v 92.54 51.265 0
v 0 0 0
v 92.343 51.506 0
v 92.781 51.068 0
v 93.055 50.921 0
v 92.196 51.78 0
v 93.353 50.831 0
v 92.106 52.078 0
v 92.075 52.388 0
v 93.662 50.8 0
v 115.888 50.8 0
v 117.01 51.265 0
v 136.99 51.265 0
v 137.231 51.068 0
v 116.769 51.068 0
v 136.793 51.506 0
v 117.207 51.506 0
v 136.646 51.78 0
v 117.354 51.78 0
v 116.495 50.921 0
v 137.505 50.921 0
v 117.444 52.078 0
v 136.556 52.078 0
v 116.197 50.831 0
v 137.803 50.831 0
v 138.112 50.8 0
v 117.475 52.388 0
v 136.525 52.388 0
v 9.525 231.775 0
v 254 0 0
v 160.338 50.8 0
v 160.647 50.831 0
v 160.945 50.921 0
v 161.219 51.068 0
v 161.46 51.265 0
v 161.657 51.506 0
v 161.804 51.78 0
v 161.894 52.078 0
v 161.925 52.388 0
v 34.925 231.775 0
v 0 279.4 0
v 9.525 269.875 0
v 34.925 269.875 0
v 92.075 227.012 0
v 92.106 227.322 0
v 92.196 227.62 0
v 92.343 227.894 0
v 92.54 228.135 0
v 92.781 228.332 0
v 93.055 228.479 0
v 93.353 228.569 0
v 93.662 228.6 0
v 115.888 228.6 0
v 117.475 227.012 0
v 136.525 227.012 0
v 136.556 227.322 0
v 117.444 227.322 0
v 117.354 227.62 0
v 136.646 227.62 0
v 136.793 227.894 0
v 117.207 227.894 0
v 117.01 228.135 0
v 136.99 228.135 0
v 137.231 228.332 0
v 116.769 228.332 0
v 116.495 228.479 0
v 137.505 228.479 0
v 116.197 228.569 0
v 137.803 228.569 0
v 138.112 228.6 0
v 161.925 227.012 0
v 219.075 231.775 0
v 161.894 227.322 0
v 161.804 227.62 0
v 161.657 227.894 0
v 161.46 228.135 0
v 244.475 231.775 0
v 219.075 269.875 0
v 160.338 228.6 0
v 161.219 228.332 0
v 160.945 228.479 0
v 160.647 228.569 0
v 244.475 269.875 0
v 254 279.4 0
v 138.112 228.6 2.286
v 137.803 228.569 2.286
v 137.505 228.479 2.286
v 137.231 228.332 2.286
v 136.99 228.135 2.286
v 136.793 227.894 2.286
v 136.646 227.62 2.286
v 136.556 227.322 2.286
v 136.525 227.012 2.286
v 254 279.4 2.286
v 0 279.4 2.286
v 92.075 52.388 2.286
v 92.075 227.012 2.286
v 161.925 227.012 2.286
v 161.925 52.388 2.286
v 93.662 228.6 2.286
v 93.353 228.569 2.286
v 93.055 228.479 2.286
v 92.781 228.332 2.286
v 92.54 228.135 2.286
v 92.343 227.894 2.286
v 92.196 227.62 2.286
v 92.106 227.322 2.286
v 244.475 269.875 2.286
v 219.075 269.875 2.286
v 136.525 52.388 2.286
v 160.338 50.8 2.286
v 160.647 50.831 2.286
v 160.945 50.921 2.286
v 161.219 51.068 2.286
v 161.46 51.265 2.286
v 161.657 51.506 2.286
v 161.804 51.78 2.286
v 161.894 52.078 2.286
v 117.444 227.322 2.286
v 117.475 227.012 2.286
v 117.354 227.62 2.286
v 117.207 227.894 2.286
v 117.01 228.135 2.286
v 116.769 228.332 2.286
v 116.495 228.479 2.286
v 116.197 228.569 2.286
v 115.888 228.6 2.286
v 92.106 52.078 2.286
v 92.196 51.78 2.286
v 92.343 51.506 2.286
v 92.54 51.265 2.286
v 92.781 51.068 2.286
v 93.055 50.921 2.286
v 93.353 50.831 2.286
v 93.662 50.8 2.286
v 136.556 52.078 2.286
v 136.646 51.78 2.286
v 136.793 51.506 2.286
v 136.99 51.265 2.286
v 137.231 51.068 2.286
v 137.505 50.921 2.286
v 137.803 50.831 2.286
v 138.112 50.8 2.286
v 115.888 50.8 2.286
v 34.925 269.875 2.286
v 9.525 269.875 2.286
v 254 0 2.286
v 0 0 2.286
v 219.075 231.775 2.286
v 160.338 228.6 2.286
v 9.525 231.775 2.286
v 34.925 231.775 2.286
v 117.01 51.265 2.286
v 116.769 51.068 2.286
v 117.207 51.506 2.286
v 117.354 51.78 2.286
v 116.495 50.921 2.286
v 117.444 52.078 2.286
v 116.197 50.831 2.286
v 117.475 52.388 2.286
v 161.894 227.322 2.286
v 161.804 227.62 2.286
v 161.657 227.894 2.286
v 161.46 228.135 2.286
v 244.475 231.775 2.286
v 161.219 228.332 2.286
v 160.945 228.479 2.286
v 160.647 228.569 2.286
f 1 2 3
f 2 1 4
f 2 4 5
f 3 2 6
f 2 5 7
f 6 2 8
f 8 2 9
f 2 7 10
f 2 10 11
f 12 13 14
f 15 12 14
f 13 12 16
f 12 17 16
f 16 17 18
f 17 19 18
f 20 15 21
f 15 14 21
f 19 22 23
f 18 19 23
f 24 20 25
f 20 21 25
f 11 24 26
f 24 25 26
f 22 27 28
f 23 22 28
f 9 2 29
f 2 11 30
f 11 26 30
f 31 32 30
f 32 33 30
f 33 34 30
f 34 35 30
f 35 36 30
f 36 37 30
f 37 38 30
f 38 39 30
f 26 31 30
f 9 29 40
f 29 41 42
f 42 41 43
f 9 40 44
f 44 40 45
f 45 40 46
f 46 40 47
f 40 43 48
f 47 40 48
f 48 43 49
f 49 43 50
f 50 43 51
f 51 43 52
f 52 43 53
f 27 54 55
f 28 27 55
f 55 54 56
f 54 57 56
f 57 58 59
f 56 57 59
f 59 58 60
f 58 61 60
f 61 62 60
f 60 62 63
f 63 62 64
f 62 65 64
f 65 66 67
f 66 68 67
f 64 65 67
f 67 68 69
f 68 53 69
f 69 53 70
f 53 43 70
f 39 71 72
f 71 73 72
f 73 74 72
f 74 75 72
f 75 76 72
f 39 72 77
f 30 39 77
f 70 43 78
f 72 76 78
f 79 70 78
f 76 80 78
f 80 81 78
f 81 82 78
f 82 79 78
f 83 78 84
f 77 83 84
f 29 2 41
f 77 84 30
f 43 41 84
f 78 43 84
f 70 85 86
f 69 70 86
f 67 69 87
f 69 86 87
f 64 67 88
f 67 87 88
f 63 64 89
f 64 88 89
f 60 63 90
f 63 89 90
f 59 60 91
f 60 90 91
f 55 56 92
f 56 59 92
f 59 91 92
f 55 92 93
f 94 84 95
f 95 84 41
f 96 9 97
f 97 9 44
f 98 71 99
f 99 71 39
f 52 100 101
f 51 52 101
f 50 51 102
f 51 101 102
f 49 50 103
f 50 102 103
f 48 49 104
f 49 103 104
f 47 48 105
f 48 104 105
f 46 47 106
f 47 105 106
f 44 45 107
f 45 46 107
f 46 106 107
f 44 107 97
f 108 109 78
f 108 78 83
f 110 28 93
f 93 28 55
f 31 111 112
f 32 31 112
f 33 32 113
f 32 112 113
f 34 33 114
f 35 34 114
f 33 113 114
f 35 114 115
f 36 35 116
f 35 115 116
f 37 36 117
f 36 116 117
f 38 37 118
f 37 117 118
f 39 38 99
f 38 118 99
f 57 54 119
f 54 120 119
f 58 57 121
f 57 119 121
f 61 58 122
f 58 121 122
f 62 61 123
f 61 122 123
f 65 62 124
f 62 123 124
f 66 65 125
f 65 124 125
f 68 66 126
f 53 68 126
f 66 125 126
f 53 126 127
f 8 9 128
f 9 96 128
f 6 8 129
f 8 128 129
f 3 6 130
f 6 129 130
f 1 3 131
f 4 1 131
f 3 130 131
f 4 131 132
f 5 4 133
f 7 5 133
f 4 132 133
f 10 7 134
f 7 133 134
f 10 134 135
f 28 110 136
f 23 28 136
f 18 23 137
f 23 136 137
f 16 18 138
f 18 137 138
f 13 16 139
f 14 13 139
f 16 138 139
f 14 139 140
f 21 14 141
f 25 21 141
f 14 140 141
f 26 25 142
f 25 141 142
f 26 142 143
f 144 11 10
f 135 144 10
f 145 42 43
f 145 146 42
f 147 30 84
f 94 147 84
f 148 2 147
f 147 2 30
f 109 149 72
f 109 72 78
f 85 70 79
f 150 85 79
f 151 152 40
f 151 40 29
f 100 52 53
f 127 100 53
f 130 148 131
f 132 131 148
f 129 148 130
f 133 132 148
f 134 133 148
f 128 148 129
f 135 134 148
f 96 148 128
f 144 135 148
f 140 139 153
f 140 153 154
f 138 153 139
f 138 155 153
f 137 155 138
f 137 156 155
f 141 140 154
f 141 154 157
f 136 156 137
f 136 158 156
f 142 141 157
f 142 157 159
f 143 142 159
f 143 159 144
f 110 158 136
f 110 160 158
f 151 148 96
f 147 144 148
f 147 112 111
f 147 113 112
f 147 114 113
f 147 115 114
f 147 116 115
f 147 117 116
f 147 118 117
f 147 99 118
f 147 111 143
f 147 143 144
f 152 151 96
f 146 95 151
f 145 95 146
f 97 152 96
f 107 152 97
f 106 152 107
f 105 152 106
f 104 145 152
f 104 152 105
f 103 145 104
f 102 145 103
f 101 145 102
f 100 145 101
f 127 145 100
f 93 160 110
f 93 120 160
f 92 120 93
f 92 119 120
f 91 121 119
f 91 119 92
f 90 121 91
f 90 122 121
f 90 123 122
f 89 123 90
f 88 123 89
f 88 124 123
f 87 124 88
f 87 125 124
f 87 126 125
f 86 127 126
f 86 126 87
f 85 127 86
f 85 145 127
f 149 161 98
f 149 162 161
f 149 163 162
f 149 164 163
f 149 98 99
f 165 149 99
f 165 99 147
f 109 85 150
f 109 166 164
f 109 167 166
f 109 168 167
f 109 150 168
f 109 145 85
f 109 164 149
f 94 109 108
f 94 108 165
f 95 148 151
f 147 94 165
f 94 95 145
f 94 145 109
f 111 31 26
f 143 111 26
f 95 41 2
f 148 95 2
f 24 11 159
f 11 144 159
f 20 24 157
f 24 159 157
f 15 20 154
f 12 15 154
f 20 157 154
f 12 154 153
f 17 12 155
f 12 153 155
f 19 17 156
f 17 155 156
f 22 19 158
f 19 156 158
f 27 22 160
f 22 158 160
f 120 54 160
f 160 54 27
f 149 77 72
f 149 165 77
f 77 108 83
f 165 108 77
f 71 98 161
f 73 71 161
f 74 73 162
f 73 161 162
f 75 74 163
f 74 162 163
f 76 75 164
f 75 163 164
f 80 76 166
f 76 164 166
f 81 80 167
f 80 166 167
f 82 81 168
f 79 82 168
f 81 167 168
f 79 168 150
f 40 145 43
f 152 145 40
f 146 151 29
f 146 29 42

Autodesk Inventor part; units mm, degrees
ref_plane "YZ Plane" through (0, 0, 0) normal (1, 0, 0) x (0, 1, 0)
ref_plane "XZ Plane" through (0, 0, 0) normal (0, 1, 0) x (-1, 0, 0)
ref_plane "XY Plane" through (0, 0, 0) normal (0, 0, 1) x (1, 0, 0)
sketch "Sketch1" plane through (0, 0, 0) normal (0, 0, 1) x (1, 0, 0)
  line L0 (0, 0) -> (254, 0)
  line L1 (254, 0) -> (254, 279.4)
  line L2 (254, 279.4) -> (0, 279.4)
  line L3 (0, 279.4) -> (0, 0)
  line L4 (92.075, 228.6) -> (117.475, 228.6)
  line L5 (117.475, 228.6) -> (117.475, 50.8)
  line L6 (117.475, 50.8) -> (92.075, 50.8)
  line L7 (92.075, 50.8) -> (92.075, 228.6)
  line L8 (136.525, 228.6) -> (161.925, 228.6)
  line L9 (161.925, 228.6) -> (161.925, 50.8)
  line L10 (161.925, 50.8) -> (136.525, 50.8)
  line L11 (136.525, 50.8) -> (136.525, 228.6)
  line L12 (117.475, 228.6) -> (136.525, 228.6)
  point P0 (127, 228.6)
  point P1 (127, 279.4)
  dimension "d0" = 254
  dimension "d1" = 279.4
  dimension "d2" = 19.05
  dimension "d3" = 25.4
  dimension "d4" = 25.4
  dimension "d5" = 50.8
  dimension "d6" = 50.8
extrude "Extrusion1" add sketch "Sketch1" along normal blind 2.286
fillet "Fillet1" radius 1.5875 8 edges at (92.075, 50.8, 1.143) (117.475, 50.8, 1.143) (136.525, 50.8, 1.143) (161.925, 50.8, 1.143) (161.925, 228.6, 1.143) (136.525, 228.6, 1.143) (117.475, 228.6, 1.143) (92.075, 228.6, 1.143)
sketch "Sketch2" plane through (0, 0, 2.286) normal (0, 0, 1) x (1, 0, 0)
  line L0 (9.525, 269.875) -> (34.925, 269.875)
  line L1 (34.925, 269.875) -> (34.925, 231.775)
  line L2 (34.925, 231.775) -> (9.525, 231.775)
  line L3 (9.525, 231.775) -> (9.525, 269.875)
  line L4 (219.075, 269.875) -> (244.475, 269.875)
  line L5 (244.475, 269.875) -> (244.475, 231.775)
  line L6 (244.475, 231.775) -> (219.075, 231.775)
  line L7 (219.075, 231.775) -> (219.075, 269.875)
  line L8 (0, 279.4) -> (0, 0) projected
  line L9 (254, 0) -> (254, 279.4) projected
  line L10 (254, 279.4) -> (0, 279.4) projected
  dimension "d10" = 9.525
  dimension "d11" = 9.525
  dimension "d12" = 9.525
  dimension "d13" = 25.4
  dimension "d14" = 38.1
extrude "Extrusion2" cut sketch "Sketch2" against normal through all
equation "\"d4\" = d3"
equation "\"d11\" = d10"
properties part number "Interior Frame"
